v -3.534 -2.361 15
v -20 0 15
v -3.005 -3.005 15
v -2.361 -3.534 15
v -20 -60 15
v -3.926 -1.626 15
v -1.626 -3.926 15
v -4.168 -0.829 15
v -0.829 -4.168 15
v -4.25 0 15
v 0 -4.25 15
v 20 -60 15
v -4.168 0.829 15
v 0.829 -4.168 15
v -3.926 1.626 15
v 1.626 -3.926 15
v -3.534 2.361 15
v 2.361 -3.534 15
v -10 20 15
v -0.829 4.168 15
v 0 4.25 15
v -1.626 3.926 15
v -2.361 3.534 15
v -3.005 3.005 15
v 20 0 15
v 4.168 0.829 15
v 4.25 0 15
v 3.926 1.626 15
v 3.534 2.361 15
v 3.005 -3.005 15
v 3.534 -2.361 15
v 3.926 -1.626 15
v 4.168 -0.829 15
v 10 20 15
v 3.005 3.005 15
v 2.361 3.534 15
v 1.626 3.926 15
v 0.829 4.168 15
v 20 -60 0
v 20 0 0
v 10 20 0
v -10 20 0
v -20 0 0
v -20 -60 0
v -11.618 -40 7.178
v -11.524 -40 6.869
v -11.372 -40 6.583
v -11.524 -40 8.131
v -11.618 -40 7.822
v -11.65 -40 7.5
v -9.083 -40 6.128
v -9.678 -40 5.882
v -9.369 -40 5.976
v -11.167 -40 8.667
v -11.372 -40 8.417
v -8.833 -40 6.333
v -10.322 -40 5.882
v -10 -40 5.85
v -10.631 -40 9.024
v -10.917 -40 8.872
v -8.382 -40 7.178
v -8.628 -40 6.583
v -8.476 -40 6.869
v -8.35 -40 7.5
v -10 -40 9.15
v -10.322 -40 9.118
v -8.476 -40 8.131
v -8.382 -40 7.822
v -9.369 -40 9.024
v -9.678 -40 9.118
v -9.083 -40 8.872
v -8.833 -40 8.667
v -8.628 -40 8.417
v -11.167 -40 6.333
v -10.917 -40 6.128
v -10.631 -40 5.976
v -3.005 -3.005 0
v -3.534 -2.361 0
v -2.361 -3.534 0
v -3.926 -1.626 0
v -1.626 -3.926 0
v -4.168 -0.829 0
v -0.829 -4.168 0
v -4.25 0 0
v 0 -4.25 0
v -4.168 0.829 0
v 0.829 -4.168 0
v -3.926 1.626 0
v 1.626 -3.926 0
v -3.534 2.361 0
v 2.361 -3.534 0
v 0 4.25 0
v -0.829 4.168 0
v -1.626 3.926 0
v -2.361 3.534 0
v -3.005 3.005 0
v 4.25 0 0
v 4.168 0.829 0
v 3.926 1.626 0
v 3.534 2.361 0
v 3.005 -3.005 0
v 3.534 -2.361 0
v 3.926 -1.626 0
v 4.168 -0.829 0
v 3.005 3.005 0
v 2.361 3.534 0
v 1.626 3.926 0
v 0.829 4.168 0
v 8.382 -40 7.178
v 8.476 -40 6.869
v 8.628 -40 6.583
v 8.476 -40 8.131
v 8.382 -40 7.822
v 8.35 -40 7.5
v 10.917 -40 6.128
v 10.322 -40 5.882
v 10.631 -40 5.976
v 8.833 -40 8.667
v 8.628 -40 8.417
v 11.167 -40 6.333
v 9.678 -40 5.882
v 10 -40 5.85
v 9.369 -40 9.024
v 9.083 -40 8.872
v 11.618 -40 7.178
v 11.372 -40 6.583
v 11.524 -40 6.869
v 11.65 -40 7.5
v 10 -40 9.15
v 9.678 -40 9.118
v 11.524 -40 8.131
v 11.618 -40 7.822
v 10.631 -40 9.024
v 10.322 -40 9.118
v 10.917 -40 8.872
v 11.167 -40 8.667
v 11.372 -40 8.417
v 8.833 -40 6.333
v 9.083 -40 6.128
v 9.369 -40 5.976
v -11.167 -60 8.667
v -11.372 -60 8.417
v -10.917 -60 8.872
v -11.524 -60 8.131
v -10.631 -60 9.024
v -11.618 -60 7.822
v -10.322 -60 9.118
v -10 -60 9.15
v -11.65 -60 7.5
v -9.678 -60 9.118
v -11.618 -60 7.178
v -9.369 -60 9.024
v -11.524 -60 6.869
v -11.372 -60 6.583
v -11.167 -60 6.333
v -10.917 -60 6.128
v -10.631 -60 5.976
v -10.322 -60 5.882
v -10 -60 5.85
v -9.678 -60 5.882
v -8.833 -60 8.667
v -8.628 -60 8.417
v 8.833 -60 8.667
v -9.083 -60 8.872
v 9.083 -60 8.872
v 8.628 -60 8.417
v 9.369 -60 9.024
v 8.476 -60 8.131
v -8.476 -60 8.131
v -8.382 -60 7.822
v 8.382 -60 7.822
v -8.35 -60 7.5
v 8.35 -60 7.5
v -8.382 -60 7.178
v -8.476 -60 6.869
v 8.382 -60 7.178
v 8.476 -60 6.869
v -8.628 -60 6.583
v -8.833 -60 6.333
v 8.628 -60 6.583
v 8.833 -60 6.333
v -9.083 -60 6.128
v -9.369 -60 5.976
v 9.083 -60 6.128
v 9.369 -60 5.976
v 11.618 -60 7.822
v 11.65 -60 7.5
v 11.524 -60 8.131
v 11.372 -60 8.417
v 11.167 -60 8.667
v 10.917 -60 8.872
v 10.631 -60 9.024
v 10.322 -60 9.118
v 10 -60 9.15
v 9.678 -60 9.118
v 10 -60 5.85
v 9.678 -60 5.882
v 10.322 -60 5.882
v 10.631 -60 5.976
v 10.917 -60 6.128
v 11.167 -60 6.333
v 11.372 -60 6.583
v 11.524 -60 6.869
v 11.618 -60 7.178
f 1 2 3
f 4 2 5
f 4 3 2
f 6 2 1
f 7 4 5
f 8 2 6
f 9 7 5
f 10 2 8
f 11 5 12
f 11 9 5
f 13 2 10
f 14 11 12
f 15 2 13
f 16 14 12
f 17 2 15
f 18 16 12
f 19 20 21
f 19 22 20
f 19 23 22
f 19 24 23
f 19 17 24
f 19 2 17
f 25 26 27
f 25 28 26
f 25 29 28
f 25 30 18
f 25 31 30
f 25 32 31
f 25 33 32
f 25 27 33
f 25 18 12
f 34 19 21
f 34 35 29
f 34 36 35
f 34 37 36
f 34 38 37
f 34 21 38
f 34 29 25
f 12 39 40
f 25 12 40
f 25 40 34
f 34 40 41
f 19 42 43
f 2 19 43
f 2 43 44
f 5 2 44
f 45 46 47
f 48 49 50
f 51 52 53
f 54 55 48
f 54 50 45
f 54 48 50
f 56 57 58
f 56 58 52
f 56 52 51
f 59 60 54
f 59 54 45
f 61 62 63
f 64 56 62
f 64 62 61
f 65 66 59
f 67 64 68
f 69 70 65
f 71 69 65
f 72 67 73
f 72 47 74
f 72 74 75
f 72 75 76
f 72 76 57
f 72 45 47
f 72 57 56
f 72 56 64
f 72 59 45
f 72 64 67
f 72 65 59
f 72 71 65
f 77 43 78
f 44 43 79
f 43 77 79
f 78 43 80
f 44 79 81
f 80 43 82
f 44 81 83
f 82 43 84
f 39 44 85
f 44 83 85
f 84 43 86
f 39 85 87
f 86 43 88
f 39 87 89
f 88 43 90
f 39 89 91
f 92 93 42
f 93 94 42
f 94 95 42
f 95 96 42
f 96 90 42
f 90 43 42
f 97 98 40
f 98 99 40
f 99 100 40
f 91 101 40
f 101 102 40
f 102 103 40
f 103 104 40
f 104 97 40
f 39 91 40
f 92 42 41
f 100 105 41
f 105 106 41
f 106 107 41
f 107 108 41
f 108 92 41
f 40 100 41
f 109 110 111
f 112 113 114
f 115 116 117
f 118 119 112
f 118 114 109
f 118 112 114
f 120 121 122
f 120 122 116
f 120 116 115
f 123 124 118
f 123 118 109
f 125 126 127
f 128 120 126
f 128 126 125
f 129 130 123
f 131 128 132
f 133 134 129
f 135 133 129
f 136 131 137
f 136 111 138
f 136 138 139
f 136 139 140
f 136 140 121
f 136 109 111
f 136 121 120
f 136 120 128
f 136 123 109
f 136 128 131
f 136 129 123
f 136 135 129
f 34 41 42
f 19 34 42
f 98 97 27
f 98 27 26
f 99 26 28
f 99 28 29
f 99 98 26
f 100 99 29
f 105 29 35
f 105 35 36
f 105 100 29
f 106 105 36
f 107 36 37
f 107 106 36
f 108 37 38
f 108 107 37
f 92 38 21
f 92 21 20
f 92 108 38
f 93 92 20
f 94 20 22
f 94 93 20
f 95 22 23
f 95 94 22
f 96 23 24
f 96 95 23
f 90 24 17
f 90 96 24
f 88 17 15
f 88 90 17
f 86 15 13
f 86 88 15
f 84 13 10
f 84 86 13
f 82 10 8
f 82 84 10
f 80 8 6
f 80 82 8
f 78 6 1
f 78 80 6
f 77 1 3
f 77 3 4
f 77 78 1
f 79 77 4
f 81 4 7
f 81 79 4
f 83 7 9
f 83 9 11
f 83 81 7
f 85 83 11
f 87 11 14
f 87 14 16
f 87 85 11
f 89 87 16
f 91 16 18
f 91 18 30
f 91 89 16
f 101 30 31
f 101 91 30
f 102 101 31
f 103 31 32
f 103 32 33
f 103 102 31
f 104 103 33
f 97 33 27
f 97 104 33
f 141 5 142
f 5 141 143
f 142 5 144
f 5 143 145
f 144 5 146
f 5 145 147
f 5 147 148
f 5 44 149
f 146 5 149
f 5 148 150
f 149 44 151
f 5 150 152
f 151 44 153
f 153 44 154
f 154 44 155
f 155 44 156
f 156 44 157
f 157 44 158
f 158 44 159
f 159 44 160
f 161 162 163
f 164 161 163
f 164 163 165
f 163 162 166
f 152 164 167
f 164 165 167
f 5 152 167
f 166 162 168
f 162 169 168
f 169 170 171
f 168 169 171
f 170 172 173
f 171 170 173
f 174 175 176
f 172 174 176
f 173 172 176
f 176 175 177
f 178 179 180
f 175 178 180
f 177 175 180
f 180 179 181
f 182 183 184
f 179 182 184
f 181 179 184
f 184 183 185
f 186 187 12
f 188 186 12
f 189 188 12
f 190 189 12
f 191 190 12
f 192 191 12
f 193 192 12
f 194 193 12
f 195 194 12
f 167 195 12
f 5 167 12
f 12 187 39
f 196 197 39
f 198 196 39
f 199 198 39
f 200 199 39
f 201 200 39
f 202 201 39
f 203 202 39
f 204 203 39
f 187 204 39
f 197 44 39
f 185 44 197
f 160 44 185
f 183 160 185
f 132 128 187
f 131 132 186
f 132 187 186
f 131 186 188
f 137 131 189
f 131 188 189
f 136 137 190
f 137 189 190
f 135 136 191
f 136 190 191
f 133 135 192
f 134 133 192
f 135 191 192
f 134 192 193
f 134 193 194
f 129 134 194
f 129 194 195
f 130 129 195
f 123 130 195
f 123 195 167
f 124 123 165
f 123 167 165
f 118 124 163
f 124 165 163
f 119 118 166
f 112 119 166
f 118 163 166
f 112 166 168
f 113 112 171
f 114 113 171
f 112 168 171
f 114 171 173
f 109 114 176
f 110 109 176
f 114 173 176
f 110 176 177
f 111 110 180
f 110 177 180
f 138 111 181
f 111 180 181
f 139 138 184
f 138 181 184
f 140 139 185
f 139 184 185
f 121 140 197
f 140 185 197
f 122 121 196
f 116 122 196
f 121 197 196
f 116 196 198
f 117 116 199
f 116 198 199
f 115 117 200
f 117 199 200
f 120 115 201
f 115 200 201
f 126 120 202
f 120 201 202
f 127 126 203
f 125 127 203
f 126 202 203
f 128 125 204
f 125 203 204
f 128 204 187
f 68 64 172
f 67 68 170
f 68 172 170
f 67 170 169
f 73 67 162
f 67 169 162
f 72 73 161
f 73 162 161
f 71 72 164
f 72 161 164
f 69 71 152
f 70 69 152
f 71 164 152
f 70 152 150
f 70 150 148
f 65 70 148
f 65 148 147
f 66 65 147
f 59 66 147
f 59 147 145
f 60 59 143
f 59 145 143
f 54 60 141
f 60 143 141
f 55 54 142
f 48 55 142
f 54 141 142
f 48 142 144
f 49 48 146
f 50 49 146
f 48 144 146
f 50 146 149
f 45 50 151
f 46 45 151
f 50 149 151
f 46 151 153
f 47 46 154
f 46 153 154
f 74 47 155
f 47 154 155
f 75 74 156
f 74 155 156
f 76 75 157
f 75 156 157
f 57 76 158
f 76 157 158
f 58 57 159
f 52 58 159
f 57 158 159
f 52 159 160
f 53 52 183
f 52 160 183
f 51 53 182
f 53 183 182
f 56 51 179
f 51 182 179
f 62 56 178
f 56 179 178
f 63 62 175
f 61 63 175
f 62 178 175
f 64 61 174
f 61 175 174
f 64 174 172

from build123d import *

# Parameters (mm, degrees)
F0_R     = 4.25
F1_DEPTH = 15
F2_R     = 1.65
F3_DEPTH = 20


with BuildPart() as f1:
    # F0 (on Top) → F1 (new body)
    with BuildSketch(Plane.XY):
        Polygon((-20, -60), (20, -60), (20, 0), (10, 20), (-10, 20), (-20, 0), align=None)
        Circle(F0_R, mode=Mode.SUBTRACT)
    extrude(amount=F1_DEPTH)

    # F2 (on face) → F3 (cut)
    with BuildSketch(Plane.XZ.offset(60)):
        with Locations((10, 7.5)):
            Circle(F2_R)
        with Locations((-10, 7.5)):
            Circle(F2_R)
    extrude(amount=-F3_DEPTH, mode=Mode.SUBTRACT)


solid = f1.part
